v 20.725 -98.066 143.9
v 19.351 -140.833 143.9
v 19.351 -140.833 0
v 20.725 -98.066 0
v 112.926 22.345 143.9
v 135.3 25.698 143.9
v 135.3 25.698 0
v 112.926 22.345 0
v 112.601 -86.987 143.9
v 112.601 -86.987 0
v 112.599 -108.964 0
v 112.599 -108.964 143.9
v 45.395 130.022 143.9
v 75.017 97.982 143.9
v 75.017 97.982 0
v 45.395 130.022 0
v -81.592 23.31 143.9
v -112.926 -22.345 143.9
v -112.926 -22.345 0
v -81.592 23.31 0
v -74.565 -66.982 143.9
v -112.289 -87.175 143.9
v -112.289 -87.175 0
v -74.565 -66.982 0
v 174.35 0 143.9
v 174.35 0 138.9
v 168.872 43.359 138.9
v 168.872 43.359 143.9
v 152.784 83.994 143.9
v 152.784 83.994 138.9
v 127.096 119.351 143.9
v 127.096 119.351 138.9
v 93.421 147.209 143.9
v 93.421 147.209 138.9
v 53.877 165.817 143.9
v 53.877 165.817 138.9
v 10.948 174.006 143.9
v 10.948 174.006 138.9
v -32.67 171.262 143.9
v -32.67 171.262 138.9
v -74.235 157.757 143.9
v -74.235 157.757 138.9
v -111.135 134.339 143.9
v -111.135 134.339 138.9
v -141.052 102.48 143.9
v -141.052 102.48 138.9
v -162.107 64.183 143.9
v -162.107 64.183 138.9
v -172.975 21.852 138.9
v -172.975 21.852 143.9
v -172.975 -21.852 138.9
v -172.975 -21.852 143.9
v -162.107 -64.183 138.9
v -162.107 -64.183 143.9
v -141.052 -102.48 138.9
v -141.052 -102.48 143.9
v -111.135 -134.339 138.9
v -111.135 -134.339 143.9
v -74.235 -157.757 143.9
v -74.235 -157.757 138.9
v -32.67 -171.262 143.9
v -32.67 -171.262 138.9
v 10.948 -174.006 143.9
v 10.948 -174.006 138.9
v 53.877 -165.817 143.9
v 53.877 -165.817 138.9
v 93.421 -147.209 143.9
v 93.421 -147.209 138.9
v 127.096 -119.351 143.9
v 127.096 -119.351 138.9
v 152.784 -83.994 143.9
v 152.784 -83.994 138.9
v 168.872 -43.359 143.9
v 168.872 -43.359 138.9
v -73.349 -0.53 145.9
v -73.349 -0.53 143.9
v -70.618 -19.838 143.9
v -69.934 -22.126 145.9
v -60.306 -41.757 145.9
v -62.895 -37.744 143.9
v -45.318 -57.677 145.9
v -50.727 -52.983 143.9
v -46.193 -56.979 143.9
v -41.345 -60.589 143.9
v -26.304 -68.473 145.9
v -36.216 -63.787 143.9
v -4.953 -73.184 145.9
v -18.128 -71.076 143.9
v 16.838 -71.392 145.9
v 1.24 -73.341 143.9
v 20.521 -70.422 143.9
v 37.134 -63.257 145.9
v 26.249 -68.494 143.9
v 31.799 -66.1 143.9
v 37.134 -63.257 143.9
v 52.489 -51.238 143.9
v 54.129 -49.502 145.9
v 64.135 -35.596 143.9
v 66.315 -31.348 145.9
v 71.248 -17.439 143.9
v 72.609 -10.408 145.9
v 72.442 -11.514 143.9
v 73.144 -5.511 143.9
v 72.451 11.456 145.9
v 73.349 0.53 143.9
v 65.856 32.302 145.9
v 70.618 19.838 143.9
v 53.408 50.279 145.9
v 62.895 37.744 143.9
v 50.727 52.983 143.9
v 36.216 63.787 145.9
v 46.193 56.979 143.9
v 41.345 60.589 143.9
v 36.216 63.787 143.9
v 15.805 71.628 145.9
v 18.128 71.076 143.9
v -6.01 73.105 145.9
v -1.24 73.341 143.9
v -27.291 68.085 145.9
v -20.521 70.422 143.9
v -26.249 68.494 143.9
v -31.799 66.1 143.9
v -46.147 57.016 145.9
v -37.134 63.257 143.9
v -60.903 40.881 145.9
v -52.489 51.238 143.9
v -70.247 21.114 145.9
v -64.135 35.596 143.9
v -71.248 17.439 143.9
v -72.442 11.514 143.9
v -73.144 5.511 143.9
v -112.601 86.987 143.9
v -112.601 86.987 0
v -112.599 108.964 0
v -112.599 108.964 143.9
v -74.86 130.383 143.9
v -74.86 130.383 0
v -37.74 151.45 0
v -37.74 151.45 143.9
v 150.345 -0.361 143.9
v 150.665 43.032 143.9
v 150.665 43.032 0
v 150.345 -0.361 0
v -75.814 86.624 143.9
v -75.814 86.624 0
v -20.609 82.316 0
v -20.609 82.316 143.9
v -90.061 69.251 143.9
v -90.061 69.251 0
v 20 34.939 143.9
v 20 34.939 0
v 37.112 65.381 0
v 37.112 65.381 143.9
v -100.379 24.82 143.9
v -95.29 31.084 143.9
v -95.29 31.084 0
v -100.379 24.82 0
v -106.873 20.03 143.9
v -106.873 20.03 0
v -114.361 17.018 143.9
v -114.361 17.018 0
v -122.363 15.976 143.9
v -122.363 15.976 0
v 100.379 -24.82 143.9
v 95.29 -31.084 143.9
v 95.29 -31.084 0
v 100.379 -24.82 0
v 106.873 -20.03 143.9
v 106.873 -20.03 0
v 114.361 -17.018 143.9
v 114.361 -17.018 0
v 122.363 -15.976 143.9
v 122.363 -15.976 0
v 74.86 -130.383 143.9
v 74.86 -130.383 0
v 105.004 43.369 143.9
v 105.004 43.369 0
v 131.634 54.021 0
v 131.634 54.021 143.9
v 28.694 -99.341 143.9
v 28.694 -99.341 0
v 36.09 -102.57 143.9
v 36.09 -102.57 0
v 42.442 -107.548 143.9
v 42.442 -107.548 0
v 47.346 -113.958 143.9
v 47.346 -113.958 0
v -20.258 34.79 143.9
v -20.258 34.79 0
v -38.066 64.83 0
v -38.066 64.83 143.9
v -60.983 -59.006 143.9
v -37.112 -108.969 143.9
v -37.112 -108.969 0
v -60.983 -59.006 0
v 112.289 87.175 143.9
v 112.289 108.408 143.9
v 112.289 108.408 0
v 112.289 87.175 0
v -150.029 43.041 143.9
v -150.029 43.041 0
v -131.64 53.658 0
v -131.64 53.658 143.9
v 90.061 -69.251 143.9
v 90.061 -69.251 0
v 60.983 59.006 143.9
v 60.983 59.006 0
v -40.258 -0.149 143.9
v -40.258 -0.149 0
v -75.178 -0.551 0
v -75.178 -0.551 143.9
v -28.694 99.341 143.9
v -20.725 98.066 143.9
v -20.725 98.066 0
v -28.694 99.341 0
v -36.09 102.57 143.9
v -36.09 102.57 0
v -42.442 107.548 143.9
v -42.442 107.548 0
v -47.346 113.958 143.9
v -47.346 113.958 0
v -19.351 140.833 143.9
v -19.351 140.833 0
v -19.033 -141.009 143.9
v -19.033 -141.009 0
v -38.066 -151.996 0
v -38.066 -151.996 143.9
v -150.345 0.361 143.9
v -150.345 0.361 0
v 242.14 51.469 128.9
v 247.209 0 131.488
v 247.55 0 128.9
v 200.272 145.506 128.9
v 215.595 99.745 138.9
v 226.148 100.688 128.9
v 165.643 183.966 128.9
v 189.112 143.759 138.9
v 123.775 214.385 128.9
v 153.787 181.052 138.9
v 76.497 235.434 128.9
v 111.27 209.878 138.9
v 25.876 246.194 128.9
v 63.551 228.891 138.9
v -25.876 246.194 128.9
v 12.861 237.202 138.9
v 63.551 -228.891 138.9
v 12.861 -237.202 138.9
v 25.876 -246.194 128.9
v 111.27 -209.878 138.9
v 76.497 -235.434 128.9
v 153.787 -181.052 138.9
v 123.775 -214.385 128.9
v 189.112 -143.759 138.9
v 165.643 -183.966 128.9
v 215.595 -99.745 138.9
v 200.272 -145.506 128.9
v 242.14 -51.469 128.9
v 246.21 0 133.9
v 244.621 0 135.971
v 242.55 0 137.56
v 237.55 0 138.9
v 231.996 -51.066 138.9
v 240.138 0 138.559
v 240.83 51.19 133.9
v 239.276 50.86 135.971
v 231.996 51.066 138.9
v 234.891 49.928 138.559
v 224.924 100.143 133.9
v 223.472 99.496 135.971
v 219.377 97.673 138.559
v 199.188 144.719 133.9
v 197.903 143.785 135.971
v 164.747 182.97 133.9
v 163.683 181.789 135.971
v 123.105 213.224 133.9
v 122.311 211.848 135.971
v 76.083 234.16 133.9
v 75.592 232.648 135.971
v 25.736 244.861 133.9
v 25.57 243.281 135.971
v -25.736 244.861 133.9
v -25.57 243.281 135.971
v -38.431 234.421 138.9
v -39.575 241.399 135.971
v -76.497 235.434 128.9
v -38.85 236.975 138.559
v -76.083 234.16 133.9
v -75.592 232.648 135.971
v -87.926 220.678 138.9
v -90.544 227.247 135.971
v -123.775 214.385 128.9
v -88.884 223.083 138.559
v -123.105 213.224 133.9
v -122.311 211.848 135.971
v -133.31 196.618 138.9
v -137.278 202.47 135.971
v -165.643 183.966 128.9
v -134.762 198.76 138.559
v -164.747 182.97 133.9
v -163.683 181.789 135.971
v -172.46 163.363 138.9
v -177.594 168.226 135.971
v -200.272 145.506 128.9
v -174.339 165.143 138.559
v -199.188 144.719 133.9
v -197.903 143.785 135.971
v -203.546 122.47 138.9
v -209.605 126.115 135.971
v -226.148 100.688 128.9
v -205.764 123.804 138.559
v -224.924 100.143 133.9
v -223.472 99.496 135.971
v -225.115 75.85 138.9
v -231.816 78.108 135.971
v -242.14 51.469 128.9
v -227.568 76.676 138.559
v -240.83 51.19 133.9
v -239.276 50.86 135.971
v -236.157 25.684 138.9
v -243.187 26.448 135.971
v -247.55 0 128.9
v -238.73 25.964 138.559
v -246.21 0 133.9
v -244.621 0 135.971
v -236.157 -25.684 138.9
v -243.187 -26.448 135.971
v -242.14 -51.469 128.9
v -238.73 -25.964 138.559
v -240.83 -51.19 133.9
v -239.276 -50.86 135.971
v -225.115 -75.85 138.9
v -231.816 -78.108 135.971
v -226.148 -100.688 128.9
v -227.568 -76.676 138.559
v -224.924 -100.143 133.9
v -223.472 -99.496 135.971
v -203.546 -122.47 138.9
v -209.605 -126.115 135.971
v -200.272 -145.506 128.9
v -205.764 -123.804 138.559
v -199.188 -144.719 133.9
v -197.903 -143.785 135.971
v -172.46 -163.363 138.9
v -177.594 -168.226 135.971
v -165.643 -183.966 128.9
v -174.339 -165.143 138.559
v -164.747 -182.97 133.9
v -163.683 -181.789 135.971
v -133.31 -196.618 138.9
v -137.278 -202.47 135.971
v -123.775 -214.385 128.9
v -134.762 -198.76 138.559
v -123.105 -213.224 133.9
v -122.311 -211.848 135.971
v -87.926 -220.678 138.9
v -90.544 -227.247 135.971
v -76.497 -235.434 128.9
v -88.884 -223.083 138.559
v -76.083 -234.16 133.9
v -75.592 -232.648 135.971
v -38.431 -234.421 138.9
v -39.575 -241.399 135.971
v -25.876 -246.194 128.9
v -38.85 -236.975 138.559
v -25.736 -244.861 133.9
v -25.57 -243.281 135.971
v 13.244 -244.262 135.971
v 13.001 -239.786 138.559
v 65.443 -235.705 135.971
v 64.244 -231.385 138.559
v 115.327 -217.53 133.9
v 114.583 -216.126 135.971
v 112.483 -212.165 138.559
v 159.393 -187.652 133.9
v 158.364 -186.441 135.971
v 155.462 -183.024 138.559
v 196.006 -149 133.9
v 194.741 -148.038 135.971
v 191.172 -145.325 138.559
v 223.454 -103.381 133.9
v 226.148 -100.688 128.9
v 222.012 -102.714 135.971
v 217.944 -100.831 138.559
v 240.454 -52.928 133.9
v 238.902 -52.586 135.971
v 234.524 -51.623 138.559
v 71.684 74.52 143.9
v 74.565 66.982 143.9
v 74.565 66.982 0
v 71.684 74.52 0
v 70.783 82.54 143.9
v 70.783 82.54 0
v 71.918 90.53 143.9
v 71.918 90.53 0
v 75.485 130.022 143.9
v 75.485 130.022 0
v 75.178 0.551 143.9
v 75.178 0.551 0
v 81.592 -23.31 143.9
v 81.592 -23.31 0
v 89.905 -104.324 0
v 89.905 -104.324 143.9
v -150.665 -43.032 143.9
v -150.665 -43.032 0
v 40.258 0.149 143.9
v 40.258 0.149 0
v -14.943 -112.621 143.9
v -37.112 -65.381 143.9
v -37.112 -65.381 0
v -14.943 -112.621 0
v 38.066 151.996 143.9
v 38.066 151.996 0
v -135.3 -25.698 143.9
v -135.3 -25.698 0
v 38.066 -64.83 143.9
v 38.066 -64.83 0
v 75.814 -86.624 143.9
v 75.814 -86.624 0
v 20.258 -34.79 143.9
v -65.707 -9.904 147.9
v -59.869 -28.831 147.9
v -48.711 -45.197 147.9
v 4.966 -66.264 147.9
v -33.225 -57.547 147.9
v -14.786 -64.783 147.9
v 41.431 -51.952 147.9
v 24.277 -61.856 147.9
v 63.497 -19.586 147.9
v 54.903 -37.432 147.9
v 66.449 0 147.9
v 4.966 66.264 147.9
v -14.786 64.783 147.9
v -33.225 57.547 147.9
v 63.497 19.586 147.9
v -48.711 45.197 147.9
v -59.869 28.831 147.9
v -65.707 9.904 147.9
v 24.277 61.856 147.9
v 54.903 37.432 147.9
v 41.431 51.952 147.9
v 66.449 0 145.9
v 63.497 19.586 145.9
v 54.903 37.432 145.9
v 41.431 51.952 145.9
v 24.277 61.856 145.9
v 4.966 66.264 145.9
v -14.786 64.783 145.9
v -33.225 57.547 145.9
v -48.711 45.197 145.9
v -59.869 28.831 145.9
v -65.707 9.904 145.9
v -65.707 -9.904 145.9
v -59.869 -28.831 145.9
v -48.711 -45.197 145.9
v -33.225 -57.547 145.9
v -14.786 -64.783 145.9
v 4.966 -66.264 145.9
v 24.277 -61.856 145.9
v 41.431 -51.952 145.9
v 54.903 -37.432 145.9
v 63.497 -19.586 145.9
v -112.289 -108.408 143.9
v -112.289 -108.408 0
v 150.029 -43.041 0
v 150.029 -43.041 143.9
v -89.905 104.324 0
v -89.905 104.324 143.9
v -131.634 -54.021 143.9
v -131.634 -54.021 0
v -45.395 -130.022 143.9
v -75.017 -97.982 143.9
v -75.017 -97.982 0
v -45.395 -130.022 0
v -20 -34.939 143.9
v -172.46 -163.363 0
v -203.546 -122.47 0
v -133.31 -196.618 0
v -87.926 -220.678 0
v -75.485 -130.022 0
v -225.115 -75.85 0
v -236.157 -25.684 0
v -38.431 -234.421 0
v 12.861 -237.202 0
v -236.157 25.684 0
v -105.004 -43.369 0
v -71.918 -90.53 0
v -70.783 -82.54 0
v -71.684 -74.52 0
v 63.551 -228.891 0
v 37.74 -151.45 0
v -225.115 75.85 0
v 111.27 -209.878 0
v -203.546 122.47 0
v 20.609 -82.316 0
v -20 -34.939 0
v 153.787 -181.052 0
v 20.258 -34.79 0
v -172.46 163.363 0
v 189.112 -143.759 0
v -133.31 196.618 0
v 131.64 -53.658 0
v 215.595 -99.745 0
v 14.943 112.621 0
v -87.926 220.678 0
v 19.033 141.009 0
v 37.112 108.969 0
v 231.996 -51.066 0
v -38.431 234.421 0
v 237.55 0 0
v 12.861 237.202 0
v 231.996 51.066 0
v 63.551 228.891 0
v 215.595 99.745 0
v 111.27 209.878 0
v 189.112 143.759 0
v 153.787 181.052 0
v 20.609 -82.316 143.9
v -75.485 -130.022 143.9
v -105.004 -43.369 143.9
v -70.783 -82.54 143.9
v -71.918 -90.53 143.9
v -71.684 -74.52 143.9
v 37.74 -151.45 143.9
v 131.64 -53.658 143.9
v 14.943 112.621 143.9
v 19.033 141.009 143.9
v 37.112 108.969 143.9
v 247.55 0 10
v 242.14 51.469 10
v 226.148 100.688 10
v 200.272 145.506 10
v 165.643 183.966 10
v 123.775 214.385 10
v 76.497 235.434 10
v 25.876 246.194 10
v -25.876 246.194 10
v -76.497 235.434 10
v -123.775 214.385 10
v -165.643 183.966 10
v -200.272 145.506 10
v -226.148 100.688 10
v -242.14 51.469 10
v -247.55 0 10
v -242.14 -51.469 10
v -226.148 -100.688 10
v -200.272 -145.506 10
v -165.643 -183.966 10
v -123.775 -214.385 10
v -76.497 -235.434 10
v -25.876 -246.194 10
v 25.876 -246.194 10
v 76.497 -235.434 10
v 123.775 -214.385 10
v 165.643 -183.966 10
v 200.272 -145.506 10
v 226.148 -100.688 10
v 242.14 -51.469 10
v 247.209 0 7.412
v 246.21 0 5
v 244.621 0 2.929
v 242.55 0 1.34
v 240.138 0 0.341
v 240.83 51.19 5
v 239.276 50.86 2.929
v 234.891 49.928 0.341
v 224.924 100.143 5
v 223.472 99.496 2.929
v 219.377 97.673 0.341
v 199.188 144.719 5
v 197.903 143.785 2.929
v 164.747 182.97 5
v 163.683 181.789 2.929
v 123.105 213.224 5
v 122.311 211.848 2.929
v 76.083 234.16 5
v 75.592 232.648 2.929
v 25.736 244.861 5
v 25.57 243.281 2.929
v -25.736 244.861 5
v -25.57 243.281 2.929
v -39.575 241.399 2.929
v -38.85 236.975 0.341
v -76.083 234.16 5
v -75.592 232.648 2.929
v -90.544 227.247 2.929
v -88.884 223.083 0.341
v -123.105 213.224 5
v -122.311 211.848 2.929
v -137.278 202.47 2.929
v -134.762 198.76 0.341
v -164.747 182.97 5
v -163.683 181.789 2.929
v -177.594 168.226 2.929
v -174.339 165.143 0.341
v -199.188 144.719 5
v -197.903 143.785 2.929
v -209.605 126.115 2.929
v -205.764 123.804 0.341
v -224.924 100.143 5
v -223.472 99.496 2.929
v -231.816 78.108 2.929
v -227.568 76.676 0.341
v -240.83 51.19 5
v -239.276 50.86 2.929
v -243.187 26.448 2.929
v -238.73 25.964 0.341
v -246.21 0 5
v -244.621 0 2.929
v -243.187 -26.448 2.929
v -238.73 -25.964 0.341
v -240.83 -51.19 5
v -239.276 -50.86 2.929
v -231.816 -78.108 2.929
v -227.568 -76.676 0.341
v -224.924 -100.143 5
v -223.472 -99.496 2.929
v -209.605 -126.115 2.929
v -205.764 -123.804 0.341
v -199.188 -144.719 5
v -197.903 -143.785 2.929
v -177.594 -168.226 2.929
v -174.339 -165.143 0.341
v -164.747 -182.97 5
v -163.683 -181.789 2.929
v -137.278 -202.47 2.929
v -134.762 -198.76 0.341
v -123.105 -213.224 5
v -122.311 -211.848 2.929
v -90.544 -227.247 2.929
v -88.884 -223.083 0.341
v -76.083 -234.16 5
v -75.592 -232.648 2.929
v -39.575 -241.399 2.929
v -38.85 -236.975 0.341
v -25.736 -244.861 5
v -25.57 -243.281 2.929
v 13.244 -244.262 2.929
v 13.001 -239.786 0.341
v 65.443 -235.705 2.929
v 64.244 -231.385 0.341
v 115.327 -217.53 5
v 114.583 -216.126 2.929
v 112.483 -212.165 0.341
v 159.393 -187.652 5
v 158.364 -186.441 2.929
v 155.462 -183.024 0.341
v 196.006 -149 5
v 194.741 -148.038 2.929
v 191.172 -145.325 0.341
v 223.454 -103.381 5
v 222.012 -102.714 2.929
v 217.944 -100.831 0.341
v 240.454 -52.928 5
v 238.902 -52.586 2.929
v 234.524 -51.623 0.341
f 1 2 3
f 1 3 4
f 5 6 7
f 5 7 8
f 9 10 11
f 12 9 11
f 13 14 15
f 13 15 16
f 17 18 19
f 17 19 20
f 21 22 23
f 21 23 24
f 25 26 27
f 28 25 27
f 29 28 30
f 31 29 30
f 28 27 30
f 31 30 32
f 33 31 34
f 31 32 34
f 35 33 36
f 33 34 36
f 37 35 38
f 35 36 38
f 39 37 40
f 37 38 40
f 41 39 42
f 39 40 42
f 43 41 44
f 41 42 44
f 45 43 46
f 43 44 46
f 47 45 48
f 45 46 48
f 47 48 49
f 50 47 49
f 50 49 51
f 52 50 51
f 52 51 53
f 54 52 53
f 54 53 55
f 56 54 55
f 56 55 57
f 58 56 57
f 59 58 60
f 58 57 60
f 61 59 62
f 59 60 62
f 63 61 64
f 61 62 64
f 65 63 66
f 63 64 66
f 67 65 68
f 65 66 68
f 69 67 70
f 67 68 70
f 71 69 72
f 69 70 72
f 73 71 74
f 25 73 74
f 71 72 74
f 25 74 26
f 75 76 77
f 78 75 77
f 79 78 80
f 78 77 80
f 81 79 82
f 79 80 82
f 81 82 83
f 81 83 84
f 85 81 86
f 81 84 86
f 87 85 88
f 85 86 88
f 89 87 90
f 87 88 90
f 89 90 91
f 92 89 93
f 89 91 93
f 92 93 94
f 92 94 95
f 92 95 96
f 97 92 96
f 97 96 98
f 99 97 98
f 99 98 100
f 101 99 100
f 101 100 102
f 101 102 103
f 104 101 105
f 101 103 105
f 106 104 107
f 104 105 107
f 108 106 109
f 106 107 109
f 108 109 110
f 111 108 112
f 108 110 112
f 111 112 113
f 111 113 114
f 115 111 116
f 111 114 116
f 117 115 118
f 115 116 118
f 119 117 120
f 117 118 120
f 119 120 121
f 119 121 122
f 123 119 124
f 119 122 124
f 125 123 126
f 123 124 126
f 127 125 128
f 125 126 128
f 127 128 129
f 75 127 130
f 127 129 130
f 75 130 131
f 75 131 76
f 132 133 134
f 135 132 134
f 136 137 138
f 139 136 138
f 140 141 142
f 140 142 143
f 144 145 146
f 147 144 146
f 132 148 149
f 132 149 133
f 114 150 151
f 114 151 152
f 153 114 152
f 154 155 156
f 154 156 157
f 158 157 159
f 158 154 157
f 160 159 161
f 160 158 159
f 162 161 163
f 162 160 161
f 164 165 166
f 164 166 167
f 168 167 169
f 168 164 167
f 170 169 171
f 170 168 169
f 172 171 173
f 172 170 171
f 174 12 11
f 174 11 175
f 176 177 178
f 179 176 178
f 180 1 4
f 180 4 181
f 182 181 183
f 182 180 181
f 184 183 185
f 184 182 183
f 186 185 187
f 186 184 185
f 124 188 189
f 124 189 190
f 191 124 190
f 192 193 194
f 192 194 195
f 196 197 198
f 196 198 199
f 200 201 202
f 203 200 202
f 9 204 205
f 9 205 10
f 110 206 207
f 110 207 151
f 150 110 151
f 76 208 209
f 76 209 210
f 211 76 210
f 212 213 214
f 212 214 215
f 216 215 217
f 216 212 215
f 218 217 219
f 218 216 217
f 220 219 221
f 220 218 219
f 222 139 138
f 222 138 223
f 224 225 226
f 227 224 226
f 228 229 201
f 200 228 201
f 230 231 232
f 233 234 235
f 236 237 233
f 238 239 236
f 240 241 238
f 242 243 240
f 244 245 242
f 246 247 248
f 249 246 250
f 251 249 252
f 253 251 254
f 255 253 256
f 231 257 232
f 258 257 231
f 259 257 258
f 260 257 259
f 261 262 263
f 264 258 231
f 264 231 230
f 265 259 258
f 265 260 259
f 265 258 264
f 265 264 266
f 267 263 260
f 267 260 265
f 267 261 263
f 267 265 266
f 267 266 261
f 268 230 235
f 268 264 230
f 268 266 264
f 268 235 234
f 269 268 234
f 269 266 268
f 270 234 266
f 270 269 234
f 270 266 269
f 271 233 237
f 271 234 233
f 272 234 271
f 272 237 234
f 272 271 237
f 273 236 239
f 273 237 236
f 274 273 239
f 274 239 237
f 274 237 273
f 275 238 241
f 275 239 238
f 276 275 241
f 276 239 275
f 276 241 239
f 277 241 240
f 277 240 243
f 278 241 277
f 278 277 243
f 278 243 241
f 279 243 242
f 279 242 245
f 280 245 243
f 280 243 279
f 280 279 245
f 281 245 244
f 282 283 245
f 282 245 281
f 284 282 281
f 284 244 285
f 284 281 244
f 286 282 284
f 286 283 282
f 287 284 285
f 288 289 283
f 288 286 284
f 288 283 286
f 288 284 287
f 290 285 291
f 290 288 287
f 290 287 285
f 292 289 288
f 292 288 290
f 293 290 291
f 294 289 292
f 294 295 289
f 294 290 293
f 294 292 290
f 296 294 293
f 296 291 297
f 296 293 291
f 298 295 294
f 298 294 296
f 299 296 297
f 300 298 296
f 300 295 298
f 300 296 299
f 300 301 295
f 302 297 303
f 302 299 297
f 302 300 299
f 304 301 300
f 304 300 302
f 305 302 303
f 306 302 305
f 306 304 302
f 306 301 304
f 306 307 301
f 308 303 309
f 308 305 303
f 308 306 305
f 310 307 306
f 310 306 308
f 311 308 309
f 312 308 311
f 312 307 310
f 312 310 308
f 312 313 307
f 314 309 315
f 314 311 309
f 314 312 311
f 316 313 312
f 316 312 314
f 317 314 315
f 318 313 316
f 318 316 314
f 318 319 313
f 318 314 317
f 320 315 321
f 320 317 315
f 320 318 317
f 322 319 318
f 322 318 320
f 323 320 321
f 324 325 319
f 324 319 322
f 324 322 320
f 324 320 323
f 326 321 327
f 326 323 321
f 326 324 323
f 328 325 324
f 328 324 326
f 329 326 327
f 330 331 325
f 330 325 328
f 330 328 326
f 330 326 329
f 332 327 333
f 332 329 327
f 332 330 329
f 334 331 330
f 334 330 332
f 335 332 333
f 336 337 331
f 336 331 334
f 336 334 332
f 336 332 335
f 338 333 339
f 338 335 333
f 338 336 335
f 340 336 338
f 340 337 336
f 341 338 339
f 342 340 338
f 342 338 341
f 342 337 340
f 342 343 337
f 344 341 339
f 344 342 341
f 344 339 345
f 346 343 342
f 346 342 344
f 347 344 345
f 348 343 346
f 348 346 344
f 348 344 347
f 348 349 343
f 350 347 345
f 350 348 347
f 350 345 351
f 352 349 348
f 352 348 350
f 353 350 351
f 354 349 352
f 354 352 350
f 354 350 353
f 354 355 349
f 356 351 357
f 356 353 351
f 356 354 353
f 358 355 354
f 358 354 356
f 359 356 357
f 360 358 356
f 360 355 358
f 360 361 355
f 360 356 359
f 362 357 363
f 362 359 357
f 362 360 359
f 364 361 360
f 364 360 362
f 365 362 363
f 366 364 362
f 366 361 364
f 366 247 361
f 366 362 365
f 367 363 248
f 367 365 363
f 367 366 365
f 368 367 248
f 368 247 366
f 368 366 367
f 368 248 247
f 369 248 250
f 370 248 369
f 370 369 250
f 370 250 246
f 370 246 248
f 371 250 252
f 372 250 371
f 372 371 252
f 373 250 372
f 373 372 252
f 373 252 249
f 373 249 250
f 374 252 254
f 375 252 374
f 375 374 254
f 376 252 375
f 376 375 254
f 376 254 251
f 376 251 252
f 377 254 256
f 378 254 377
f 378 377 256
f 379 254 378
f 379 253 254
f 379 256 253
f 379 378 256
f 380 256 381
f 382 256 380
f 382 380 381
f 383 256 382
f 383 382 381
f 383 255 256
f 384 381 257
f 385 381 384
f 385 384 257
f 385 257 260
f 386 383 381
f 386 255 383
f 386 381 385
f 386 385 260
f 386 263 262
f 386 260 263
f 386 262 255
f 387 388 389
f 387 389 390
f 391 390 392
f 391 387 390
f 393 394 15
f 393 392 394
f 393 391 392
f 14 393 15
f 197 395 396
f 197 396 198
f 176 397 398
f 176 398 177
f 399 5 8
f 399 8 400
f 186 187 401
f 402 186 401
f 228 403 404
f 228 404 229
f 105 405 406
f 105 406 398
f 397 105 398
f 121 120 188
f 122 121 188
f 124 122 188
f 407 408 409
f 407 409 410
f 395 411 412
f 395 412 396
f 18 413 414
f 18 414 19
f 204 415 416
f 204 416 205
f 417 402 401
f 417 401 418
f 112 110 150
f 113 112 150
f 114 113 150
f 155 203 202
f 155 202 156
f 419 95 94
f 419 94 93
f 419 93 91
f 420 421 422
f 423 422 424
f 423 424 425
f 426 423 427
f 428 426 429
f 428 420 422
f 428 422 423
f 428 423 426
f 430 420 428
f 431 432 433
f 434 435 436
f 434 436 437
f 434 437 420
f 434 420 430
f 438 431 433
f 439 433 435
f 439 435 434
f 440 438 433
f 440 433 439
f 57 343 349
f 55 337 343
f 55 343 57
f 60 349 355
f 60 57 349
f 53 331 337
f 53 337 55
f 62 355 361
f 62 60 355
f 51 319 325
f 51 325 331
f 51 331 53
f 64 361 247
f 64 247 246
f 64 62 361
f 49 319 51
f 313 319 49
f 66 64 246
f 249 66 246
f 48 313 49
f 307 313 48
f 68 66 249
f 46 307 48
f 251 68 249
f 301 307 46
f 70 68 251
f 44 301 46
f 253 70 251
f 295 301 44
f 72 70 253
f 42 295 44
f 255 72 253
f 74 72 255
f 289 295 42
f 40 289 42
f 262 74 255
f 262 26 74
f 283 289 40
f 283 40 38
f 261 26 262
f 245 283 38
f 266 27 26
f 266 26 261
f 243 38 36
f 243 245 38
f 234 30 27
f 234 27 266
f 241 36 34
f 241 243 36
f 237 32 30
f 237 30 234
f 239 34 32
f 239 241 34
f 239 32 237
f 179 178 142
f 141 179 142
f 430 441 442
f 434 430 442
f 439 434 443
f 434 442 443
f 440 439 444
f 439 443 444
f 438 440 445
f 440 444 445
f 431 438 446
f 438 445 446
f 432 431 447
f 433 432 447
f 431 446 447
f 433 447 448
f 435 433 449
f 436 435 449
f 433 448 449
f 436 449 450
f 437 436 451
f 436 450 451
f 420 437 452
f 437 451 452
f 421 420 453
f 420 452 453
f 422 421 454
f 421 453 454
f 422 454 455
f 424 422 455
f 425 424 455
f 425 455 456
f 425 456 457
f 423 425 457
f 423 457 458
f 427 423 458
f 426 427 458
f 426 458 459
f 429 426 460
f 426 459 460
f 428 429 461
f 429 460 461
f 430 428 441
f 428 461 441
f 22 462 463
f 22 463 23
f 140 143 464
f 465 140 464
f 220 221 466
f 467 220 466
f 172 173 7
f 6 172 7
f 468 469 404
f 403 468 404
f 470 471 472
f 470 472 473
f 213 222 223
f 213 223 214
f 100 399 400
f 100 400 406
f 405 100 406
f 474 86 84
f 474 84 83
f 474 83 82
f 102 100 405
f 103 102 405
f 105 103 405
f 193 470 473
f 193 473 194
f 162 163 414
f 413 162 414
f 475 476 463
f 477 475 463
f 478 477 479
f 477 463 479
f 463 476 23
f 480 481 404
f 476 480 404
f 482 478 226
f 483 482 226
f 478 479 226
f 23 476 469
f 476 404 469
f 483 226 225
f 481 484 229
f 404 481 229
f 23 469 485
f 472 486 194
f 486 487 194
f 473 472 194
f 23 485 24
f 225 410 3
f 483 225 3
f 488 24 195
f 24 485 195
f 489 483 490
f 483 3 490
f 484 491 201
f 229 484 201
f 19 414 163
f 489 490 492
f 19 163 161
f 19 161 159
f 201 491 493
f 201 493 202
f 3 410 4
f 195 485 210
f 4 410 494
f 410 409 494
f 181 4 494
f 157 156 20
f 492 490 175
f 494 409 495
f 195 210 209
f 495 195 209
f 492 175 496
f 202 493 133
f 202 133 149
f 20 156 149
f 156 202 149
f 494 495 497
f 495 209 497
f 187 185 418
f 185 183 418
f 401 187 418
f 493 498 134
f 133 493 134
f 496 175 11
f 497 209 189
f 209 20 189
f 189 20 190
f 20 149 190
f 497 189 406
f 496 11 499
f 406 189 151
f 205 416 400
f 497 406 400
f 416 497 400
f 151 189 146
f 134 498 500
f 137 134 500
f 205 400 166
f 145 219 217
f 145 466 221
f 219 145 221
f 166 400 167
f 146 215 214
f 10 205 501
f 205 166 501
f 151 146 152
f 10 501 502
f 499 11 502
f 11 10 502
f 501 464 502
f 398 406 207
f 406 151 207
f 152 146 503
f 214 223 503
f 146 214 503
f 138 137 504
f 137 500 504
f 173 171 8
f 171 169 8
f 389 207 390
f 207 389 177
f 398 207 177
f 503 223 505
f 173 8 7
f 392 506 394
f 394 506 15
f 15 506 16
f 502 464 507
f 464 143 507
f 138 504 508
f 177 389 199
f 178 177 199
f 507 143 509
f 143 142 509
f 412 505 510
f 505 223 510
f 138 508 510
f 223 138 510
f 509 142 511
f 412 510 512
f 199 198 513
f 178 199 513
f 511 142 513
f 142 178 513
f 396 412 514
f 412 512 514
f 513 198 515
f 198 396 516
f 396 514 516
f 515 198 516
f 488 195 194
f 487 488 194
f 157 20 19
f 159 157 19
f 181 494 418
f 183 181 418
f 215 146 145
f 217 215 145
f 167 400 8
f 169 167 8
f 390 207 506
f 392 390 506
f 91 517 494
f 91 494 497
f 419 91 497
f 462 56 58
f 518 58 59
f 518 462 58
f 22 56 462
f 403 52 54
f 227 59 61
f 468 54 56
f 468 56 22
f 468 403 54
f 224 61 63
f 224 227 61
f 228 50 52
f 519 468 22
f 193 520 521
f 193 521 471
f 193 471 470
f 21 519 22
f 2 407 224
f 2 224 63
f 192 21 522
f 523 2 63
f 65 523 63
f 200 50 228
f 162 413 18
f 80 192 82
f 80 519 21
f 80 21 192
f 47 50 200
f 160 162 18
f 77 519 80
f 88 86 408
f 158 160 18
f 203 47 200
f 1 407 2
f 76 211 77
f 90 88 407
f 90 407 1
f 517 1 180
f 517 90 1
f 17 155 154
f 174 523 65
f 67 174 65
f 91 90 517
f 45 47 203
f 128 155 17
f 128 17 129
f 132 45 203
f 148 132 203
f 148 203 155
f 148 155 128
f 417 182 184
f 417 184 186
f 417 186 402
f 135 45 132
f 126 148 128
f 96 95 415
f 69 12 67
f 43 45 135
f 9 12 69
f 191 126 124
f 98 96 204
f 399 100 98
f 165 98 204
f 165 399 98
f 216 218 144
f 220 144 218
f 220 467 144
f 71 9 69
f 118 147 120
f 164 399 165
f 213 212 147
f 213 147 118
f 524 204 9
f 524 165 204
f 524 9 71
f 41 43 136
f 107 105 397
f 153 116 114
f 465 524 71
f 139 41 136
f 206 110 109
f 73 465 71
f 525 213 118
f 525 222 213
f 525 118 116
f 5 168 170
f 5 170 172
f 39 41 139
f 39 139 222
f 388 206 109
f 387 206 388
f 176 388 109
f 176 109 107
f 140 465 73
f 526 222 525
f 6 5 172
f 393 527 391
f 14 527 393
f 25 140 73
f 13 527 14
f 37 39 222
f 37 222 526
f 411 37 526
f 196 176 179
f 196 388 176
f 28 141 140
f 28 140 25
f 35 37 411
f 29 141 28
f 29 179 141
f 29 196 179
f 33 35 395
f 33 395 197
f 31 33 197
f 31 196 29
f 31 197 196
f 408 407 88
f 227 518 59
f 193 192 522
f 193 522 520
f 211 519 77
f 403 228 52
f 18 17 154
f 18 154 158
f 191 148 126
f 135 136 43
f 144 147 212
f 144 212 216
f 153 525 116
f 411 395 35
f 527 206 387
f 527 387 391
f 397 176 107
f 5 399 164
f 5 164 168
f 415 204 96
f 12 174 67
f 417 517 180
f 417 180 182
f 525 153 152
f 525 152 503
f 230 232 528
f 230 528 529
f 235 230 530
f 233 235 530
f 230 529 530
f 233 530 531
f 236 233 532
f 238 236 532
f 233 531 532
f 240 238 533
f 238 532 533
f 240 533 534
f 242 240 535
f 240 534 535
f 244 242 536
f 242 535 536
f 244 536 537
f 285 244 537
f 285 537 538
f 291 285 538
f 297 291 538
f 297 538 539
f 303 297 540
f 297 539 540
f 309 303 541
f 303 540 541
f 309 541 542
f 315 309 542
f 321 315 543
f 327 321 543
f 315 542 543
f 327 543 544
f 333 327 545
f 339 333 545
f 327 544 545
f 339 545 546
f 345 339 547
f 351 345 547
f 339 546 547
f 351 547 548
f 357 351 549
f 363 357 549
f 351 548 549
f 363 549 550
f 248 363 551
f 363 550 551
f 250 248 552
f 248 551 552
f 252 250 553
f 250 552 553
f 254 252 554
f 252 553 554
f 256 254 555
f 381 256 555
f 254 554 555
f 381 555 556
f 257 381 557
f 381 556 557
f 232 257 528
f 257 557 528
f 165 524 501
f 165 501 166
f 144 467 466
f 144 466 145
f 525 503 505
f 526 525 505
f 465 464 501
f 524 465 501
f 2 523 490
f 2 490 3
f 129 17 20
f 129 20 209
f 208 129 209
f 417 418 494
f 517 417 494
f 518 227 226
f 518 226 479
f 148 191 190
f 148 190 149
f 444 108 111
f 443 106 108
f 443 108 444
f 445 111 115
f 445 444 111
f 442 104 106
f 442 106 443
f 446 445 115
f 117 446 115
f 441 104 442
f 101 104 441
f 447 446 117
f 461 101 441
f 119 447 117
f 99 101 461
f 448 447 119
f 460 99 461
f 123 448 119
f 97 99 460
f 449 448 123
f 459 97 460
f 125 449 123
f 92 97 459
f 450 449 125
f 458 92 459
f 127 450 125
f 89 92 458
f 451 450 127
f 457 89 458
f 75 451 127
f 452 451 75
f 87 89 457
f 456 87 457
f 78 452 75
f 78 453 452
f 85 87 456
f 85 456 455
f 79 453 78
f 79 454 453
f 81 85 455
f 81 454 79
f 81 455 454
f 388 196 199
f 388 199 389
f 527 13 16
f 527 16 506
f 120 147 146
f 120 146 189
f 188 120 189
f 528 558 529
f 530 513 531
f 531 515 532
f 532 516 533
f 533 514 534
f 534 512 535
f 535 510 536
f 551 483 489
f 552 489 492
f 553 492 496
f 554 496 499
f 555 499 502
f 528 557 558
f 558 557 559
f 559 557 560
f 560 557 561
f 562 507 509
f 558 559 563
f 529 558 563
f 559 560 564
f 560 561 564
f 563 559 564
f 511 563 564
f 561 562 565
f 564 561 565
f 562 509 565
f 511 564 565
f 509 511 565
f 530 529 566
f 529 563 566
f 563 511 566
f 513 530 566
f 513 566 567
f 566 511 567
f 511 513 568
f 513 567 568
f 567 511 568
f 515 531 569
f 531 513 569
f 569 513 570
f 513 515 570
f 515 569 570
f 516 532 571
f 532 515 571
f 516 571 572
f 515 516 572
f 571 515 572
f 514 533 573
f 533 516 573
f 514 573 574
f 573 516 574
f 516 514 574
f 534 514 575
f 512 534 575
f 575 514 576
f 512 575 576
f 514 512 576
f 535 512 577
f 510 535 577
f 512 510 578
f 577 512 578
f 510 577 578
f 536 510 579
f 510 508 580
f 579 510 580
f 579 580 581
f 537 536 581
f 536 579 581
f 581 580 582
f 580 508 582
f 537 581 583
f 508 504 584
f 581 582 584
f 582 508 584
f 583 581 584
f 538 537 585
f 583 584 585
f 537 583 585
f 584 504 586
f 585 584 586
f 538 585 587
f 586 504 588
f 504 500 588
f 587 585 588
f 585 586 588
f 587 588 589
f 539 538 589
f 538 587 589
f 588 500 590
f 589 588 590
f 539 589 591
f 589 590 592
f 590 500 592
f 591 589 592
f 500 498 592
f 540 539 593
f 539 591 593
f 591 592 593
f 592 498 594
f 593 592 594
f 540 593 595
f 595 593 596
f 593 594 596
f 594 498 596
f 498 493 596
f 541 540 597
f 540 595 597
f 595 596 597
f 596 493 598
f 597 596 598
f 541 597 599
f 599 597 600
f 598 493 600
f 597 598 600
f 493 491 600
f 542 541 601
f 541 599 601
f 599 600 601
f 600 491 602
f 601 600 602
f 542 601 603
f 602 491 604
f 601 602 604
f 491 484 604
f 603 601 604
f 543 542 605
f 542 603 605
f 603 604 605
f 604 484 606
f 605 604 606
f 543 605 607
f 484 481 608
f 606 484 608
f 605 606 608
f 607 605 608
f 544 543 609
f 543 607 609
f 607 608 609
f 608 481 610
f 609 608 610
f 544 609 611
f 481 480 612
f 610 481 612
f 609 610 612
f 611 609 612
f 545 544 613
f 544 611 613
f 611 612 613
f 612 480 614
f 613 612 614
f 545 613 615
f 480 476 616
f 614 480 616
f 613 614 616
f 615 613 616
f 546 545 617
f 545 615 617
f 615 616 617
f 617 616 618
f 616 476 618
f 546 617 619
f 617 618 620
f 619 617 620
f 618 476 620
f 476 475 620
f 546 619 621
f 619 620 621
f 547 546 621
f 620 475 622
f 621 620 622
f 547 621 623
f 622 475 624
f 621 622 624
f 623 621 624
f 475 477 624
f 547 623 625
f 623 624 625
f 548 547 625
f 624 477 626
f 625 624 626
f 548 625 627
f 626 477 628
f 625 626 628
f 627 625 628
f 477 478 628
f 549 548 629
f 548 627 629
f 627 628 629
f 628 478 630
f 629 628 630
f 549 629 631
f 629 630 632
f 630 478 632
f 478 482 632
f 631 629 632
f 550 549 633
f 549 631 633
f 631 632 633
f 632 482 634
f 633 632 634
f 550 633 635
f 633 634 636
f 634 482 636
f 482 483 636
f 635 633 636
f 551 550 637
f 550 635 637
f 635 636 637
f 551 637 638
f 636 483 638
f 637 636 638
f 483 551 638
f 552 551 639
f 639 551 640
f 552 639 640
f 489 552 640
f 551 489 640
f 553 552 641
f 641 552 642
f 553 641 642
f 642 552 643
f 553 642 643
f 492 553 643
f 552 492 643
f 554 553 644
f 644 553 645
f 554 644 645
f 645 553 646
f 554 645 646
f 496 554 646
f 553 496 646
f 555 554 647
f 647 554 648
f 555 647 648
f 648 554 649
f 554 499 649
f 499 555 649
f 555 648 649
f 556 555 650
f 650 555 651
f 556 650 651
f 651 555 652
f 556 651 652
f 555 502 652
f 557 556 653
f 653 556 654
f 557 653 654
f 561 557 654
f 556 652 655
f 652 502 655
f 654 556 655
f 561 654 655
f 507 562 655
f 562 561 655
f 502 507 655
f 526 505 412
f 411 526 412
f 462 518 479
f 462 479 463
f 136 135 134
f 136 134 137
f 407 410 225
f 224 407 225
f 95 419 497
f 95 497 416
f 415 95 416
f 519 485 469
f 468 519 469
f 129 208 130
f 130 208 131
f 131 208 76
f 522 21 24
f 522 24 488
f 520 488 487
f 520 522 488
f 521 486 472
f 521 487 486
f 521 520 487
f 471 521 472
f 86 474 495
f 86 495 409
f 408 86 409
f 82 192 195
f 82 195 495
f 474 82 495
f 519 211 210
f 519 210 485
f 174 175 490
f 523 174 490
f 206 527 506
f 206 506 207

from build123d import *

# Parameters (mm, degrees)
SKETCH2_R           = 247.55
BOSS_EXTRUDE1_DEPTH = 138.9
FILLET1_R           = 10
FILLET2_R           = 10
SKETCH3_R           = 174.35
BOSS_EXTRUDE2_DEPTH = 5
CUT_EXTRUDE1_DEPTH  = 178
SKETCH9_R           = 73.351235991
BOSS_EXTRUDE3_DEPTH = 2
SKETCH10_R          = 66.449367693
BOSS_EXTRUDE4_DEPTH = 2


with BuildPart() as part:
    # Sketch2 → Boss-Extrude1 (new body)
    with BuildSketch(Plane.XY):
        Circle(SKETCH2_R)
    extrude(amount=BOSS_EXTRUDE1_DEPTH)

    # Fillet1
    fillet1_edges = [part.edges().sort_by_distance(p)[0] for p in [
        (-247.55, 0, 138.9),
    ]]
    fillet(fillet1_edges, radius=FILLET1_R)

    # Fillet2
    fillet2_edges = [part.edges().sort_by_distance(p)[0] for p in [
        (-247.55, 0, 0),
    ]]
    fillet(fillet2_edges, radius=FILLET2_R)

    # Sketch3 → Boss-Extrude2 (add)
    with BuildSketch(Plane.XY.offset(138.9)):
        Circle(SKETCH3_R)
    extrude(amount=BOSS_EXTRUDE2_DEPTH)

    # Sketch5 → Cut-Extrude1 (cut)
    with BuildSketch(Plane.XY.offset(143.9)):
        with BuildLine():
            Line((105.003706731, 43.369407929), (131.633696581, 54.021395774))
            Line((131.633696581, 54.021395774), (150.665269372, 43.031925067))
            Line((150.665269372, 43.031925067), (150.344554361, -0.360940867))
            Line((150.344554361, -0.360940867), (150.02910614, -43.041207894))
            Line((150.02910614, -43.041207894), (131.640430833, -53.657914533))
            Line((131.640430833, -53.657914533), (95.29019948, -31.084252667))
            ThreePointArc((95.29019948, -31.084252667), (106.873400183, -20.029907867), (122.363240346, -15.976029572))
            Line((122.363240346, -15.976029572), (135.299603851, 25.697677813))
            Line((135.299603851, 25.697677813), (112.925565246, 22.34468352))
            Line((112.925565246, 22.34468352), (81.592210025, -23.310129617))
            Line((81.592210025, -23.310129617), (40.25767623, 0.148769441))
            Line((40.25767623, 0.148769441), (75.177682959, 0.55093352))
            Line((75.177682959, 0.55093352), (105.003706731, 43.369407929))
        make_face()
        with BuildLine():
            Line((90.060862379, -69.251173556), (112.600749379, -86.987427346))
            Line((112.600749379, -86.987427346), (112.599374968, -108.963988211))
            Line((112.599374968, -108.963988211), (74.859693221, -130.38267383))
            Line((74.859693221, -130.38267383), (37.739773625, -151.449621172))
            Line((37.739773625, -151.449621172), (19.351098317, -140.832914533))
            Line((19.351098317, -140.832914533), (20.725347273, -98.065859815))
            ThreePointArc((20.725347273, -98.065859815), (36.090291044, -102.570033481), (47.345972712, -113.957689415))
            Line((47.345972712, -113.957689415), (89.90464373, -104.32405515))
            Line((89.90464373, -104.32405515), (75.813846191, -86.62406648))
            Line((75.813846191, -86.62406648), (20.608940598, -82.315991441))
            Line((20.608940598, -82.315991441), (20.25767623, -34.789785592))
            Line((20.25767623, -34.789785592), (38.065963903, -64.83031648))
            Line((38.065963903, -64.83031648), (90.060862379, -69.251173556))
        make_face()
        with BuildLine():
            Line((19.032947202, 141.008823121), (38.065894405, 151.995913278))
            Line((38.065894405, 151.995913278), (75.48486114, 130.021732964))
            Line((75.48486114, 130.021732964), (112.289332516, 108.408413278))
            Line((112.289332516, 108.408413278), (112.289332516, 87.175))
            Line((112.289332516, 87.175), (74.564852207, 66.981607148))
            ThreePointArc((74.564852207, 66.981607148), (70.78310914, 82.540125614), (75.017267633, 97.981659843))
            Line((75.017267633, 97.981659843), (45.394960121, 130.021732964))
            Line((45.394960121, 130.021732964), (37.111719056, 108.96875))
            Line((37.111719056, 108.96875), (60.983269426, 59.005861824))
            Line((60.983269426, 59.005861824), (20, 34.938555033))
            Line((20, 34.938555033), (37.111719056, 65.38125))
            Line((37.111719056, 65.38125), (14.942844352, 112.620581485))
            Line((14.942844352, 112.620581485), (19.032947202, 141.008823121))
        make_face()
        with BuildLine():
            Line((-14.942844352, -112.620581485), (-19.032947202, -141.008823121))
            Line((-19.032947202, -141.008823121), (-38.065894405, -151.995913278))
            Line((-38.065894405, -151.995913278), (-75.48486114, -130.021732964))
            Line((-75.48486114, -130.021732964), (-112.289332516, -108.408413278))
            Line((-112.289332516, -108.408413278), (-112.289332516, -87.175))
            Line((-112.289332516, -87.175), (-74.564852207, -66.981607148))
            ThreePointArc((-74.564852207, -66.981607148), (-70.78310914, -82.540125614), (-75.017267633, -97.981659843))
            Line((-75.017267633, -97.981659843), (-45.394960121, -130.021732964))
            Line((-45.394960121, -130.021732964), (-37.111719056, -108.96875))
            Line((-37.111719056, -108.96875), (-60.983269426, -59.005861824))
            Line((-60.983269426, -59.005861824), (-20, -34.938555033))
            Line((-20, -34.938555033), (-37.111719056, -65.38125))
            Line((-37.111719056, -65.38125), (-14.942844352, -112.620581485))
        make_face()
        with BuildLine():
            Line((-105.003706731, -43.369407929), (-131.633696581, -54.021395774))
            Line((-131.633696581, -54.021395774), (-150.665269372, -43.031925067))
            Line((-150.665269372, -43.031925067), (-150.344554361, 0.360940867))
            Line((-150.344554361, 0.360940867), (-150.02910614, 43.041207894))
            Line((-150.02910614, 43.041207894), (-131.640430833, 53.657914533))
            Line((-131.640430833, 53.657914533), (-95.29019948, 31.084252667))
            ThreePointArc((-95.29019948, 31.084252667), (-106.873400183, 20.029907867), (-122.363240346, 15.976029572))
            Line((-122.363240346, 15.976029572), (-135.299603851, -25.697677813))
            Line((-135.299603851, -25.697677813), (-112.925565246, -22.34468352))
            Line((-112.925565246, -22.34468352), (-81.592210025, 23.310129617))
            Line((-81.592210025, 23.310129617), (-40.25767623, -0.148769441))
            Line((-40.25767623, -0.148769441), (-75.177682959, -0.55093352))
            Line((-75.177682959, -0.55093352), (-105.003706731, -43.369407929))
        make_face()
        with BuildLine():
            Line((-90.060862379, 69.251173556), (-112.600749379, 86.987427346))
            Line((-112.600749379, 86.987427346), (-112.599374968, 108.963988211))
            Line((-112.599374968, 108.963988211), (-74.859693221, 130.38267383))
            Line((-74.859693221, 130.38267383), (-37.739773625, 151.449621172))
            Line((-37.739773625, 151.449621172), (-19.351098317, 140.832914533))
            Line((-19.351098317, 140.832914533), (-20.725347273, 98.065859815))
            ThreePointArc((-20.725347273, 98.065859815), (-36.090291044, 102.570033481), (-47.345972712, 113.957689415))
            Line((-47.345972712, 113.957689415), (-89.90464373, 104.32405515))
            Line((-89.90464373, 104.32405515), (-75.813846191, 86.62406648))
            Line((-75.813846191, 86.62406648), (-20.608940598, 82.315991441))
            Line((-20.608940598, 82.315991441), (-20.25767623, 34.789785592))
            Line((-20.25767623, 34.789785592), (-38.065963903, 64.83031648))
            Line((-38.065963903, 64.83031648), (-90.060862379, 69.251173556))
        make_face()
    extrude(amount=-CUT_EXTRUDE1_DEPTH, mode=Mode.SUBTRACT)

    # Sketch9 → Boss-Extrude3 (add)
    with BuildSketch(Plane.XY.offset(143.9)):
        with Locations(Location((0, 0, 0), (0, 0, 180.413898519))):
            Circle(SKETCH9_R)
    extrude(amount=BOSS_EXTRUDE3_DEPTH)

    # Sketch10 → Boss-Extrude4 (add)
    with BuildSketch(Plane.XY.offset(145.9)):
        Circle(SKETCH10_R)
    extrude(amount=BOSS_EXTRUDE4_DEPTH)


solid = part.part
